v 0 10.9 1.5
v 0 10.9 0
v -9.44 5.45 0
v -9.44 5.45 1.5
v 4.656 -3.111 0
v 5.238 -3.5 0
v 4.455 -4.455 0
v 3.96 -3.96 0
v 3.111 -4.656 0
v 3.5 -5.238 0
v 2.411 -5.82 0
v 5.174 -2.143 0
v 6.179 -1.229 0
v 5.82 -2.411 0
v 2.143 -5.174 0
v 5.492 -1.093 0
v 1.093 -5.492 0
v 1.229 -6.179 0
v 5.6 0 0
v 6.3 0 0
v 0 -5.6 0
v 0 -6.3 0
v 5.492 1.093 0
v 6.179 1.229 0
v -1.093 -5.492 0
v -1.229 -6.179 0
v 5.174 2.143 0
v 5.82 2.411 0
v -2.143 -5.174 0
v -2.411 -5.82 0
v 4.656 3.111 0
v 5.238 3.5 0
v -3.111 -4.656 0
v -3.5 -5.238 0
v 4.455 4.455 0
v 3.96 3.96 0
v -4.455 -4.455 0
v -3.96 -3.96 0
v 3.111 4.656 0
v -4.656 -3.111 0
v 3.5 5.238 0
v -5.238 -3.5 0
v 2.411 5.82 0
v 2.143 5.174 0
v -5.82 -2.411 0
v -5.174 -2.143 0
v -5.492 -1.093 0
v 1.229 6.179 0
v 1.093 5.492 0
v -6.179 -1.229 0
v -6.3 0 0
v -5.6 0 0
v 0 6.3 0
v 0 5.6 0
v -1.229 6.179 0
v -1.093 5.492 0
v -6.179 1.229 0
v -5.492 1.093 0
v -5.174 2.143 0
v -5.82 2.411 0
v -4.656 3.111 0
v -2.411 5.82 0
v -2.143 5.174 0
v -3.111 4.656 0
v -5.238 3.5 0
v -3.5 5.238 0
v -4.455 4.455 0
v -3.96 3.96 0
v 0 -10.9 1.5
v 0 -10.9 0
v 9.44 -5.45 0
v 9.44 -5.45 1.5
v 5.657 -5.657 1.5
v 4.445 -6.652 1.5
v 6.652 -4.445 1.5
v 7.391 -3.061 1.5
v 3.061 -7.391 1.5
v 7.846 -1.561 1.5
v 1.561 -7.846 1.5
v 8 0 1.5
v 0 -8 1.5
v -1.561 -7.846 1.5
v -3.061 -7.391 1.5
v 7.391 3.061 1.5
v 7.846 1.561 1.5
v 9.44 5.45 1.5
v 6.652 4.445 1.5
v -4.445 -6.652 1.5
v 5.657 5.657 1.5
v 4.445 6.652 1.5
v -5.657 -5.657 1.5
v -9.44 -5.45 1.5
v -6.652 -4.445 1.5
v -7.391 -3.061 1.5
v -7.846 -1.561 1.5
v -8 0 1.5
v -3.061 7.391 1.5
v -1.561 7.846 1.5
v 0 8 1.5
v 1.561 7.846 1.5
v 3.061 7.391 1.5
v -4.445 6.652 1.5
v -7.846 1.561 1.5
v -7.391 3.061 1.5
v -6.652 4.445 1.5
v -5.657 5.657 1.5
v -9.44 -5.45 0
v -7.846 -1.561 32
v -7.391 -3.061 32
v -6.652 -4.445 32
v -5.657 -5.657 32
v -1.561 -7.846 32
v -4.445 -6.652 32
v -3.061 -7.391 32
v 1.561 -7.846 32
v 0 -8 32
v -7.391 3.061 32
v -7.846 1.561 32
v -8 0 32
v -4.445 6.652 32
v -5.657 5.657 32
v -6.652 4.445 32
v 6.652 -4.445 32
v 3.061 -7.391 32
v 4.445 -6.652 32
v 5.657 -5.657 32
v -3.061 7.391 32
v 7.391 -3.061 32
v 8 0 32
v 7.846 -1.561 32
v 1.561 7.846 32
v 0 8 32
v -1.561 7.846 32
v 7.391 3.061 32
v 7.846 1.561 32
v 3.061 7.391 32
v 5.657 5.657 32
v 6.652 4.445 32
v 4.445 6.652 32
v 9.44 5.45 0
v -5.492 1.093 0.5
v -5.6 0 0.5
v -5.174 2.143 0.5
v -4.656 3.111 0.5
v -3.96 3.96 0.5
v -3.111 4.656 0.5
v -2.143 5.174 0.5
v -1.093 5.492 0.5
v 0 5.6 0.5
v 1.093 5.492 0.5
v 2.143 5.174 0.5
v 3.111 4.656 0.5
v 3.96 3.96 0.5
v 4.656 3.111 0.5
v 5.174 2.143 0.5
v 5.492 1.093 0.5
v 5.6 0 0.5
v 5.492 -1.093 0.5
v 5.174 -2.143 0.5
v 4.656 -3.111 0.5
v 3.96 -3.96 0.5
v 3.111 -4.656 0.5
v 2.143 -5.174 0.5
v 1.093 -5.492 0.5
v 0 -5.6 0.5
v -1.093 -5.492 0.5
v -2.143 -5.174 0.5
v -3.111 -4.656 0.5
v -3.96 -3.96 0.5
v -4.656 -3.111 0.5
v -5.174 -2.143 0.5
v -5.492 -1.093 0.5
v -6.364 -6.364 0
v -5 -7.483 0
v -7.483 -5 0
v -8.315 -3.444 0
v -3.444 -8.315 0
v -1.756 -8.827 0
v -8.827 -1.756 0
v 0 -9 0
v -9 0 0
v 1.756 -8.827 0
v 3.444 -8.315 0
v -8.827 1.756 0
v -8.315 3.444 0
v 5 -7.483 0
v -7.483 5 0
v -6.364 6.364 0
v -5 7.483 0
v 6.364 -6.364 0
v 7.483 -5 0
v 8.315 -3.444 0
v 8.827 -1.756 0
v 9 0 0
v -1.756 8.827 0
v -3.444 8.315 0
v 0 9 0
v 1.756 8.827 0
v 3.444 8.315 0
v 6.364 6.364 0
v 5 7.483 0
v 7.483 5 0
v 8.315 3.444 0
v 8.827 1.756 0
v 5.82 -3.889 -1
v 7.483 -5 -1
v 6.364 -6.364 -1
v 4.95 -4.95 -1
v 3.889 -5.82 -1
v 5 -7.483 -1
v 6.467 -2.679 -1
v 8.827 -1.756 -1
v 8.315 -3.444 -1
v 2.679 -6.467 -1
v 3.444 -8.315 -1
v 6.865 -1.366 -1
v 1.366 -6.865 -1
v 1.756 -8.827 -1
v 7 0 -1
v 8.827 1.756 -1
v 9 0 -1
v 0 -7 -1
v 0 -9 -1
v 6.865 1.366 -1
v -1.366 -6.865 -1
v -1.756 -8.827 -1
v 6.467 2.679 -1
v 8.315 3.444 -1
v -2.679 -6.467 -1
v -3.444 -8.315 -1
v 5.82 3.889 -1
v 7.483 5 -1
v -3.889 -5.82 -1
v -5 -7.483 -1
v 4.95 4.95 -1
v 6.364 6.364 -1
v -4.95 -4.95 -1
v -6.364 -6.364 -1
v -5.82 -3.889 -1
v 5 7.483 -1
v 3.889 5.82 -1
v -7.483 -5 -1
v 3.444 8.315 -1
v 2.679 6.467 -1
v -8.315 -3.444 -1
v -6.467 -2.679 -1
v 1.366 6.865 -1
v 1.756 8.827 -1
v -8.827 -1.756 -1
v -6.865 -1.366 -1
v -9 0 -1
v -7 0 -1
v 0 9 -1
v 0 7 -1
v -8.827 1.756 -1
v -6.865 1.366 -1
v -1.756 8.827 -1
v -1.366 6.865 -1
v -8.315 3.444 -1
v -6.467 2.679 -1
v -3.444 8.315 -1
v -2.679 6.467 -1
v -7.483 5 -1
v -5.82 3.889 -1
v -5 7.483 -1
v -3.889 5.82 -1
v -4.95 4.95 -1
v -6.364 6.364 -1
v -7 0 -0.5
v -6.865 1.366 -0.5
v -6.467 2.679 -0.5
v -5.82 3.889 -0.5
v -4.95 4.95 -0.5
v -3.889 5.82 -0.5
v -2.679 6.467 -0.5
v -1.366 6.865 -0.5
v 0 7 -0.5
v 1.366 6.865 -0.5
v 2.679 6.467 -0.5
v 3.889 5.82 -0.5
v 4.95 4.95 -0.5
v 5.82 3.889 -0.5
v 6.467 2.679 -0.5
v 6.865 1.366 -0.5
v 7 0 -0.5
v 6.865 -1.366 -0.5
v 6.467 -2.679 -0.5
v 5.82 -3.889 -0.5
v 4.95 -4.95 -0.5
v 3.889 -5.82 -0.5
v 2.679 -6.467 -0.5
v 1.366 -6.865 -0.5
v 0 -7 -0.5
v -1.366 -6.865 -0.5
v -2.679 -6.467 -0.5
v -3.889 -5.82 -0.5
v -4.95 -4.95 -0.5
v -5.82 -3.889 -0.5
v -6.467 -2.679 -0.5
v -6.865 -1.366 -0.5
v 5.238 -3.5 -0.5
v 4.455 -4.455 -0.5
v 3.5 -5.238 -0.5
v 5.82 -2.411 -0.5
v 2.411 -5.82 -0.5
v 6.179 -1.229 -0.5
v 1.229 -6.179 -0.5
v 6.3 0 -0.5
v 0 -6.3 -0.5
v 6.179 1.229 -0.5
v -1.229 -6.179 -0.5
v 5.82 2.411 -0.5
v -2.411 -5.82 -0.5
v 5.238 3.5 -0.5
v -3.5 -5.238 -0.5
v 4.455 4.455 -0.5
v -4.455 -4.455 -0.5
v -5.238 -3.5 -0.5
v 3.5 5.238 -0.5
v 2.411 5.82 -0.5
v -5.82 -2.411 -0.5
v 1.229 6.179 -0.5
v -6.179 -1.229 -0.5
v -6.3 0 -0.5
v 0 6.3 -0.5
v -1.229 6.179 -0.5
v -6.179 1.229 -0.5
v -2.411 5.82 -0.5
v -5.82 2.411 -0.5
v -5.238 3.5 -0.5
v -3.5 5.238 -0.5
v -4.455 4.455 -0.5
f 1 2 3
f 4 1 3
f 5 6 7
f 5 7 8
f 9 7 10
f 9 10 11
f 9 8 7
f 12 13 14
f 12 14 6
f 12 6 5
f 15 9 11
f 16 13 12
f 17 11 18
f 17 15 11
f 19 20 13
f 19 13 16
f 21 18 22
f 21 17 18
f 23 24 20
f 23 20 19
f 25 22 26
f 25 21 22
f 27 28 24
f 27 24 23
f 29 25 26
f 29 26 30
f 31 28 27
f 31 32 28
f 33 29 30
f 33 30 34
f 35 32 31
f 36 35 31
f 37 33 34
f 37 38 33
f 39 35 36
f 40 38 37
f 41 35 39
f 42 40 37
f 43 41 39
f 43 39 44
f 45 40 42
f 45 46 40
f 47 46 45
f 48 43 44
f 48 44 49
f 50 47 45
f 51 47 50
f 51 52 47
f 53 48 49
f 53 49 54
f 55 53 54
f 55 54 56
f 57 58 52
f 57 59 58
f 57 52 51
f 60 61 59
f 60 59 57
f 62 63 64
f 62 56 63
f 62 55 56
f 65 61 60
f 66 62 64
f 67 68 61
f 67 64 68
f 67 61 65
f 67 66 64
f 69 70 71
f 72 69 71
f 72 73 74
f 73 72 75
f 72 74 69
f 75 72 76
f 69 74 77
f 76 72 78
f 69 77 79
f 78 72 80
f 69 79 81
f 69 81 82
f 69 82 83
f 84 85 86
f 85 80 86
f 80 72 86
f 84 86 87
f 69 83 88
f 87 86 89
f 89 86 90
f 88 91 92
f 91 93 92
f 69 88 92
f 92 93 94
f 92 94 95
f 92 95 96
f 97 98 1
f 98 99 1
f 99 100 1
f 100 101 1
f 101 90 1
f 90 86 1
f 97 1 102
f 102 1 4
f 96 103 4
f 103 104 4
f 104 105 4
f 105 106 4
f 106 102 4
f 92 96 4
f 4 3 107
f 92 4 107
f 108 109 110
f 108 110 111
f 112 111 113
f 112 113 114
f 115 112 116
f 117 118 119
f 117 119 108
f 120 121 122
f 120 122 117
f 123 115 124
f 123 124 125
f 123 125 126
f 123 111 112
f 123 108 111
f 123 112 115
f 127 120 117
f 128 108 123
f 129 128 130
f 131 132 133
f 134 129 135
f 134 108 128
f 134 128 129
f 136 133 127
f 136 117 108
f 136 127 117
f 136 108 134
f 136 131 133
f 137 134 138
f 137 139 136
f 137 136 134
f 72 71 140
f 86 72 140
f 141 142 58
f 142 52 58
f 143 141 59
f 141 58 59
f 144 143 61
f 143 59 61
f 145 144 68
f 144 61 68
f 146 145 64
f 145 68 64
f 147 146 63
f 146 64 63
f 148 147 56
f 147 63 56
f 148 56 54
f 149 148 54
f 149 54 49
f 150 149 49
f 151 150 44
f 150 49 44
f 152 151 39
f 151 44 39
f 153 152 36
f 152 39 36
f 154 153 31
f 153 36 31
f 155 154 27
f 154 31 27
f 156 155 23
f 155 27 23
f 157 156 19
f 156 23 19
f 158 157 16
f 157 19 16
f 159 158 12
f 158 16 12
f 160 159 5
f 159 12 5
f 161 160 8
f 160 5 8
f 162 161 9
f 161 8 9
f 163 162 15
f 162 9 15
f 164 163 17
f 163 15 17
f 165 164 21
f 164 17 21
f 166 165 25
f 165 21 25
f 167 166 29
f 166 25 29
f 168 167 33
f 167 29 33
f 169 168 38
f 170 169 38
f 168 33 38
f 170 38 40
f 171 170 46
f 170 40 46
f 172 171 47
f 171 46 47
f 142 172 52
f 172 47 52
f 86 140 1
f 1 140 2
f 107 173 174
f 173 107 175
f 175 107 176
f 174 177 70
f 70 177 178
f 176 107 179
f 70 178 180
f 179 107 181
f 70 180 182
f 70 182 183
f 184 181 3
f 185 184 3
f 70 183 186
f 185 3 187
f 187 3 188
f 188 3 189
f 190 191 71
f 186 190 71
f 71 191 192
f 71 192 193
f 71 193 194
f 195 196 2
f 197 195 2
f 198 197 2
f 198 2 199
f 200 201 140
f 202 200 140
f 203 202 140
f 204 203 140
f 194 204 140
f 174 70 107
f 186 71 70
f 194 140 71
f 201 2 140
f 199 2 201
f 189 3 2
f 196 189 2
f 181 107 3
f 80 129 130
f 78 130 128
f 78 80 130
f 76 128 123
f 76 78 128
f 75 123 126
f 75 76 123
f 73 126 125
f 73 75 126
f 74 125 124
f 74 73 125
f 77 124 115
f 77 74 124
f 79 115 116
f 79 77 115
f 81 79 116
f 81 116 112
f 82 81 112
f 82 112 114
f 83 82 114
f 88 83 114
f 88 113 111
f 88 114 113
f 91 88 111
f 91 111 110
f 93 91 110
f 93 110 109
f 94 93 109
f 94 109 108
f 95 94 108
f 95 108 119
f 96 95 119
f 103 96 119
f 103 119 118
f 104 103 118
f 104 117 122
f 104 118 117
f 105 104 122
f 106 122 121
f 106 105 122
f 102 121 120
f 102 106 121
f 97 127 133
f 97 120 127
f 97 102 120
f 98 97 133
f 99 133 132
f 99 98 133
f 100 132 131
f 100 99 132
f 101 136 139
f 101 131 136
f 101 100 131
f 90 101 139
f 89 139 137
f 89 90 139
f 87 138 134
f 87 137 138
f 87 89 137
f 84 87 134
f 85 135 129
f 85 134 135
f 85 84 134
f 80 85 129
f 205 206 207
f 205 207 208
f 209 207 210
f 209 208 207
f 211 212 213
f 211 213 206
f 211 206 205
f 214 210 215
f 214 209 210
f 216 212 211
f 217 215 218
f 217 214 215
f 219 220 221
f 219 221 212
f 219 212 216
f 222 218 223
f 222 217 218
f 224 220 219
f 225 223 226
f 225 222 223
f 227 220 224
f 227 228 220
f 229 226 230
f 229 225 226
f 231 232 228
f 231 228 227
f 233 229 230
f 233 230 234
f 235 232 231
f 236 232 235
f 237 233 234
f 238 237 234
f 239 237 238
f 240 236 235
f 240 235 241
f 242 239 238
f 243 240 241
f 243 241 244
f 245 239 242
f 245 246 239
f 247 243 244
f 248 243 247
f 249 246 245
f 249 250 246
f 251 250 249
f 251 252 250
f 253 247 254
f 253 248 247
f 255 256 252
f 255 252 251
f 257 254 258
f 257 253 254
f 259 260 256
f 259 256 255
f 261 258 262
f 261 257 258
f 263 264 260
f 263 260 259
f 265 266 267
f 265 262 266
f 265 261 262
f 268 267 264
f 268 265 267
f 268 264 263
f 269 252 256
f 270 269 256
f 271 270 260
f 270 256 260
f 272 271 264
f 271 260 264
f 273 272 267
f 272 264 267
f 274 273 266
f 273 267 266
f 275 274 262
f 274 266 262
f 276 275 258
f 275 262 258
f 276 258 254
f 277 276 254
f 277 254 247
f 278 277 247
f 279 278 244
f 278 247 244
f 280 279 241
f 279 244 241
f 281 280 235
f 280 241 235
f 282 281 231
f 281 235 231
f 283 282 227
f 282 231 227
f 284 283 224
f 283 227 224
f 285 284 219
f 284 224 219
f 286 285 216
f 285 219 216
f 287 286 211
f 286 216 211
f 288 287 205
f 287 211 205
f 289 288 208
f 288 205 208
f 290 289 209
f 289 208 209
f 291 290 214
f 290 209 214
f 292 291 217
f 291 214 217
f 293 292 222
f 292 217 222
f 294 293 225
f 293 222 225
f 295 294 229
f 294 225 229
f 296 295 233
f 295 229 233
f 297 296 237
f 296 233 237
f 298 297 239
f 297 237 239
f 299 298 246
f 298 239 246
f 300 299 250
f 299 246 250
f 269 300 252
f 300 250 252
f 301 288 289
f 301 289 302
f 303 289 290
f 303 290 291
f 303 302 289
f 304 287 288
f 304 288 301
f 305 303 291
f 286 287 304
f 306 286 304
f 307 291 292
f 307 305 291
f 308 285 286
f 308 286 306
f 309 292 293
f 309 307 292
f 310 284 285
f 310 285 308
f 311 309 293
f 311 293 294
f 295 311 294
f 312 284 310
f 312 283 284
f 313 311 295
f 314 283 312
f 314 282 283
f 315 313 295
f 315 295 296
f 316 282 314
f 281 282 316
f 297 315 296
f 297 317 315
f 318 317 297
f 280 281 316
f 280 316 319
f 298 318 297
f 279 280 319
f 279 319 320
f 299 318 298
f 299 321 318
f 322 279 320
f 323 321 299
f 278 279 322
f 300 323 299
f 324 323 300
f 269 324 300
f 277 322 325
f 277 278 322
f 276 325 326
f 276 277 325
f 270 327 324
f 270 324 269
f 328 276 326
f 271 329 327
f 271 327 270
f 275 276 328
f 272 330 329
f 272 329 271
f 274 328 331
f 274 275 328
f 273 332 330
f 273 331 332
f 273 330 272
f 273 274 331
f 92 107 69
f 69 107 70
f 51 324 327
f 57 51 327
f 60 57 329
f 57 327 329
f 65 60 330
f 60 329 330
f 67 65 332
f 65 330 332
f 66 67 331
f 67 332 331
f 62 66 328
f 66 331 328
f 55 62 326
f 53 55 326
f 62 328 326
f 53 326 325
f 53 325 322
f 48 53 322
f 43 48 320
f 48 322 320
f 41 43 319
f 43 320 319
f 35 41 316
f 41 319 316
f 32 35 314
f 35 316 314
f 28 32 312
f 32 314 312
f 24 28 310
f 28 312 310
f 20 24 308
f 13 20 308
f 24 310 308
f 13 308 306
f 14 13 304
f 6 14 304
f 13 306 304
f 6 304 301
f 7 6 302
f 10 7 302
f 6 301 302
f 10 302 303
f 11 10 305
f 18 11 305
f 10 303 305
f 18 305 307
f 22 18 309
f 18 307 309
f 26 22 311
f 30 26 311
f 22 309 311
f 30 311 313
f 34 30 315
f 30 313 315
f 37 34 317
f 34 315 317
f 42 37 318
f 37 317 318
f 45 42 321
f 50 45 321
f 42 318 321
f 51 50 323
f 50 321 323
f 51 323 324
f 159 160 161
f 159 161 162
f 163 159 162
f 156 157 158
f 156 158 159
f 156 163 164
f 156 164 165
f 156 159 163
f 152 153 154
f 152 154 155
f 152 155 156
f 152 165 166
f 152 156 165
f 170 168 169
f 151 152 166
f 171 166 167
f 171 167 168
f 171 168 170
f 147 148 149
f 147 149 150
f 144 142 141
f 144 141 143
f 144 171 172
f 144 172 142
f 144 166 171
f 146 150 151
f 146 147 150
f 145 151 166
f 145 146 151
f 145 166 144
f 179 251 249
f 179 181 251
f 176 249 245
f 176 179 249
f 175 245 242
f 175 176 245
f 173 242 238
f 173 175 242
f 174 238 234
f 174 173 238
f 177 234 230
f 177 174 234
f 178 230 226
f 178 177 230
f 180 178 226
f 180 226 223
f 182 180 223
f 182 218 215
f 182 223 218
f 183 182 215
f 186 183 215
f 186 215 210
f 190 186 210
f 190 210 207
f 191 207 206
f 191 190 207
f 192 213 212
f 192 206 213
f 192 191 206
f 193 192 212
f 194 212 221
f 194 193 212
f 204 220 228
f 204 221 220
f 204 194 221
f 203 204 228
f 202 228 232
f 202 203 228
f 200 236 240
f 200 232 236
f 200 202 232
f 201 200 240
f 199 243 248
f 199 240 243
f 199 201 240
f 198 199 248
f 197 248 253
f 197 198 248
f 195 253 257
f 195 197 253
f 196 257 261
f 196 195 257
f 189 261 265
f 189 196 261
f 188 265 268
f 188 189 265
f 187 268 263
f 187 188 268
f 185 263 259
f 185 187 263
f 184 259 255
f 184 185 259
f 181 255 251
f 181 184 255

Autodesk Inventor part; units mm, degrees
ref_plane "YZ Plane" through (0, 0, 0) normal (1, 0, 0) x (0, 1, 0)
ref_plane "XZ Plane" through (0, 0, 0) normal (0, 1, 0) x (-1, 0, 0)
ref_plane "XY Plane" through (0, 0, 0) normal (0, 0, 1) x (1, 0, 0)
sketch "Sketch1" plane through (0, 0, 0) normal (0, 0, 1) x (1, 0, 0)
  circle A0 centre (0, 0) radius 8
  dimension "d0" = 16
extrude "Extrusion1" add sketch "Sketch1" along normal blind 32
sketch "Sketch2" plane through (0, 0, 0) normal (0, 0, -1) x (-1, 0, 0)
  line L0 (0, 10.9) -> (9.4397, 5.45)
  line L1 (9.4397, 5.45) -> (9.4397, -5.45)
  line L2 (9.4397, -5.45) -> (0, -10.9)
  line L3 (0, -10.9) -> (-9.4397, -5.45)
  line L4 (-9.4397, -5.45) -> (-9.4397, 5.45)
  line L5 (-9.4397, 5.45) -> (0, 10.9)
  point P0 (0, 0)
  point P1 (0, 0)
  dimension "d3" = 21.8
extrude "Extrusion2" add sketch "Sketch2" against normal blind 1.5
sketch "Sketch3" plane through (0, 0, 0) normal (0, 0, -1) x (-1, 0, 0)
  circle A0 centre (0, 0) radius 9
  dimension "d6" = 18
extrude "Extrusion3" add sketch "Sketch3" along normal blind 1
sketch "Sketch4" plane through (0, 0, -1) normal (0, 0, -1) x (-1, 0, 0)
  circle A0 centre (0, 0) radius 6.3
  dimension "d9" = 12.6
extrude "Extrusion4" cut sketch "Sketch4" against normal blind 1
sketch "Sketch5" plane through (0, 0, 0) normal (0, 0, -1) x (-1, 0, 0)
  circle A0 centre (0, 0) radius 5.6
  dimension "d12" = 11.2
extrude "Extrusion5" cut sketch "Sketch5" against normal blind 0.5
sketch "Sketch6" plane through (0, 0, -1) normal (0, 0, -1) x (-1, 0, 0)
  circle A0 centre (0, 0) radius 7
  dimension "d15" = 14
extrude "Extrusion6" cut sketch "Sketch6" against normal blind 0.5
properties part number "16mmToggleButton"
